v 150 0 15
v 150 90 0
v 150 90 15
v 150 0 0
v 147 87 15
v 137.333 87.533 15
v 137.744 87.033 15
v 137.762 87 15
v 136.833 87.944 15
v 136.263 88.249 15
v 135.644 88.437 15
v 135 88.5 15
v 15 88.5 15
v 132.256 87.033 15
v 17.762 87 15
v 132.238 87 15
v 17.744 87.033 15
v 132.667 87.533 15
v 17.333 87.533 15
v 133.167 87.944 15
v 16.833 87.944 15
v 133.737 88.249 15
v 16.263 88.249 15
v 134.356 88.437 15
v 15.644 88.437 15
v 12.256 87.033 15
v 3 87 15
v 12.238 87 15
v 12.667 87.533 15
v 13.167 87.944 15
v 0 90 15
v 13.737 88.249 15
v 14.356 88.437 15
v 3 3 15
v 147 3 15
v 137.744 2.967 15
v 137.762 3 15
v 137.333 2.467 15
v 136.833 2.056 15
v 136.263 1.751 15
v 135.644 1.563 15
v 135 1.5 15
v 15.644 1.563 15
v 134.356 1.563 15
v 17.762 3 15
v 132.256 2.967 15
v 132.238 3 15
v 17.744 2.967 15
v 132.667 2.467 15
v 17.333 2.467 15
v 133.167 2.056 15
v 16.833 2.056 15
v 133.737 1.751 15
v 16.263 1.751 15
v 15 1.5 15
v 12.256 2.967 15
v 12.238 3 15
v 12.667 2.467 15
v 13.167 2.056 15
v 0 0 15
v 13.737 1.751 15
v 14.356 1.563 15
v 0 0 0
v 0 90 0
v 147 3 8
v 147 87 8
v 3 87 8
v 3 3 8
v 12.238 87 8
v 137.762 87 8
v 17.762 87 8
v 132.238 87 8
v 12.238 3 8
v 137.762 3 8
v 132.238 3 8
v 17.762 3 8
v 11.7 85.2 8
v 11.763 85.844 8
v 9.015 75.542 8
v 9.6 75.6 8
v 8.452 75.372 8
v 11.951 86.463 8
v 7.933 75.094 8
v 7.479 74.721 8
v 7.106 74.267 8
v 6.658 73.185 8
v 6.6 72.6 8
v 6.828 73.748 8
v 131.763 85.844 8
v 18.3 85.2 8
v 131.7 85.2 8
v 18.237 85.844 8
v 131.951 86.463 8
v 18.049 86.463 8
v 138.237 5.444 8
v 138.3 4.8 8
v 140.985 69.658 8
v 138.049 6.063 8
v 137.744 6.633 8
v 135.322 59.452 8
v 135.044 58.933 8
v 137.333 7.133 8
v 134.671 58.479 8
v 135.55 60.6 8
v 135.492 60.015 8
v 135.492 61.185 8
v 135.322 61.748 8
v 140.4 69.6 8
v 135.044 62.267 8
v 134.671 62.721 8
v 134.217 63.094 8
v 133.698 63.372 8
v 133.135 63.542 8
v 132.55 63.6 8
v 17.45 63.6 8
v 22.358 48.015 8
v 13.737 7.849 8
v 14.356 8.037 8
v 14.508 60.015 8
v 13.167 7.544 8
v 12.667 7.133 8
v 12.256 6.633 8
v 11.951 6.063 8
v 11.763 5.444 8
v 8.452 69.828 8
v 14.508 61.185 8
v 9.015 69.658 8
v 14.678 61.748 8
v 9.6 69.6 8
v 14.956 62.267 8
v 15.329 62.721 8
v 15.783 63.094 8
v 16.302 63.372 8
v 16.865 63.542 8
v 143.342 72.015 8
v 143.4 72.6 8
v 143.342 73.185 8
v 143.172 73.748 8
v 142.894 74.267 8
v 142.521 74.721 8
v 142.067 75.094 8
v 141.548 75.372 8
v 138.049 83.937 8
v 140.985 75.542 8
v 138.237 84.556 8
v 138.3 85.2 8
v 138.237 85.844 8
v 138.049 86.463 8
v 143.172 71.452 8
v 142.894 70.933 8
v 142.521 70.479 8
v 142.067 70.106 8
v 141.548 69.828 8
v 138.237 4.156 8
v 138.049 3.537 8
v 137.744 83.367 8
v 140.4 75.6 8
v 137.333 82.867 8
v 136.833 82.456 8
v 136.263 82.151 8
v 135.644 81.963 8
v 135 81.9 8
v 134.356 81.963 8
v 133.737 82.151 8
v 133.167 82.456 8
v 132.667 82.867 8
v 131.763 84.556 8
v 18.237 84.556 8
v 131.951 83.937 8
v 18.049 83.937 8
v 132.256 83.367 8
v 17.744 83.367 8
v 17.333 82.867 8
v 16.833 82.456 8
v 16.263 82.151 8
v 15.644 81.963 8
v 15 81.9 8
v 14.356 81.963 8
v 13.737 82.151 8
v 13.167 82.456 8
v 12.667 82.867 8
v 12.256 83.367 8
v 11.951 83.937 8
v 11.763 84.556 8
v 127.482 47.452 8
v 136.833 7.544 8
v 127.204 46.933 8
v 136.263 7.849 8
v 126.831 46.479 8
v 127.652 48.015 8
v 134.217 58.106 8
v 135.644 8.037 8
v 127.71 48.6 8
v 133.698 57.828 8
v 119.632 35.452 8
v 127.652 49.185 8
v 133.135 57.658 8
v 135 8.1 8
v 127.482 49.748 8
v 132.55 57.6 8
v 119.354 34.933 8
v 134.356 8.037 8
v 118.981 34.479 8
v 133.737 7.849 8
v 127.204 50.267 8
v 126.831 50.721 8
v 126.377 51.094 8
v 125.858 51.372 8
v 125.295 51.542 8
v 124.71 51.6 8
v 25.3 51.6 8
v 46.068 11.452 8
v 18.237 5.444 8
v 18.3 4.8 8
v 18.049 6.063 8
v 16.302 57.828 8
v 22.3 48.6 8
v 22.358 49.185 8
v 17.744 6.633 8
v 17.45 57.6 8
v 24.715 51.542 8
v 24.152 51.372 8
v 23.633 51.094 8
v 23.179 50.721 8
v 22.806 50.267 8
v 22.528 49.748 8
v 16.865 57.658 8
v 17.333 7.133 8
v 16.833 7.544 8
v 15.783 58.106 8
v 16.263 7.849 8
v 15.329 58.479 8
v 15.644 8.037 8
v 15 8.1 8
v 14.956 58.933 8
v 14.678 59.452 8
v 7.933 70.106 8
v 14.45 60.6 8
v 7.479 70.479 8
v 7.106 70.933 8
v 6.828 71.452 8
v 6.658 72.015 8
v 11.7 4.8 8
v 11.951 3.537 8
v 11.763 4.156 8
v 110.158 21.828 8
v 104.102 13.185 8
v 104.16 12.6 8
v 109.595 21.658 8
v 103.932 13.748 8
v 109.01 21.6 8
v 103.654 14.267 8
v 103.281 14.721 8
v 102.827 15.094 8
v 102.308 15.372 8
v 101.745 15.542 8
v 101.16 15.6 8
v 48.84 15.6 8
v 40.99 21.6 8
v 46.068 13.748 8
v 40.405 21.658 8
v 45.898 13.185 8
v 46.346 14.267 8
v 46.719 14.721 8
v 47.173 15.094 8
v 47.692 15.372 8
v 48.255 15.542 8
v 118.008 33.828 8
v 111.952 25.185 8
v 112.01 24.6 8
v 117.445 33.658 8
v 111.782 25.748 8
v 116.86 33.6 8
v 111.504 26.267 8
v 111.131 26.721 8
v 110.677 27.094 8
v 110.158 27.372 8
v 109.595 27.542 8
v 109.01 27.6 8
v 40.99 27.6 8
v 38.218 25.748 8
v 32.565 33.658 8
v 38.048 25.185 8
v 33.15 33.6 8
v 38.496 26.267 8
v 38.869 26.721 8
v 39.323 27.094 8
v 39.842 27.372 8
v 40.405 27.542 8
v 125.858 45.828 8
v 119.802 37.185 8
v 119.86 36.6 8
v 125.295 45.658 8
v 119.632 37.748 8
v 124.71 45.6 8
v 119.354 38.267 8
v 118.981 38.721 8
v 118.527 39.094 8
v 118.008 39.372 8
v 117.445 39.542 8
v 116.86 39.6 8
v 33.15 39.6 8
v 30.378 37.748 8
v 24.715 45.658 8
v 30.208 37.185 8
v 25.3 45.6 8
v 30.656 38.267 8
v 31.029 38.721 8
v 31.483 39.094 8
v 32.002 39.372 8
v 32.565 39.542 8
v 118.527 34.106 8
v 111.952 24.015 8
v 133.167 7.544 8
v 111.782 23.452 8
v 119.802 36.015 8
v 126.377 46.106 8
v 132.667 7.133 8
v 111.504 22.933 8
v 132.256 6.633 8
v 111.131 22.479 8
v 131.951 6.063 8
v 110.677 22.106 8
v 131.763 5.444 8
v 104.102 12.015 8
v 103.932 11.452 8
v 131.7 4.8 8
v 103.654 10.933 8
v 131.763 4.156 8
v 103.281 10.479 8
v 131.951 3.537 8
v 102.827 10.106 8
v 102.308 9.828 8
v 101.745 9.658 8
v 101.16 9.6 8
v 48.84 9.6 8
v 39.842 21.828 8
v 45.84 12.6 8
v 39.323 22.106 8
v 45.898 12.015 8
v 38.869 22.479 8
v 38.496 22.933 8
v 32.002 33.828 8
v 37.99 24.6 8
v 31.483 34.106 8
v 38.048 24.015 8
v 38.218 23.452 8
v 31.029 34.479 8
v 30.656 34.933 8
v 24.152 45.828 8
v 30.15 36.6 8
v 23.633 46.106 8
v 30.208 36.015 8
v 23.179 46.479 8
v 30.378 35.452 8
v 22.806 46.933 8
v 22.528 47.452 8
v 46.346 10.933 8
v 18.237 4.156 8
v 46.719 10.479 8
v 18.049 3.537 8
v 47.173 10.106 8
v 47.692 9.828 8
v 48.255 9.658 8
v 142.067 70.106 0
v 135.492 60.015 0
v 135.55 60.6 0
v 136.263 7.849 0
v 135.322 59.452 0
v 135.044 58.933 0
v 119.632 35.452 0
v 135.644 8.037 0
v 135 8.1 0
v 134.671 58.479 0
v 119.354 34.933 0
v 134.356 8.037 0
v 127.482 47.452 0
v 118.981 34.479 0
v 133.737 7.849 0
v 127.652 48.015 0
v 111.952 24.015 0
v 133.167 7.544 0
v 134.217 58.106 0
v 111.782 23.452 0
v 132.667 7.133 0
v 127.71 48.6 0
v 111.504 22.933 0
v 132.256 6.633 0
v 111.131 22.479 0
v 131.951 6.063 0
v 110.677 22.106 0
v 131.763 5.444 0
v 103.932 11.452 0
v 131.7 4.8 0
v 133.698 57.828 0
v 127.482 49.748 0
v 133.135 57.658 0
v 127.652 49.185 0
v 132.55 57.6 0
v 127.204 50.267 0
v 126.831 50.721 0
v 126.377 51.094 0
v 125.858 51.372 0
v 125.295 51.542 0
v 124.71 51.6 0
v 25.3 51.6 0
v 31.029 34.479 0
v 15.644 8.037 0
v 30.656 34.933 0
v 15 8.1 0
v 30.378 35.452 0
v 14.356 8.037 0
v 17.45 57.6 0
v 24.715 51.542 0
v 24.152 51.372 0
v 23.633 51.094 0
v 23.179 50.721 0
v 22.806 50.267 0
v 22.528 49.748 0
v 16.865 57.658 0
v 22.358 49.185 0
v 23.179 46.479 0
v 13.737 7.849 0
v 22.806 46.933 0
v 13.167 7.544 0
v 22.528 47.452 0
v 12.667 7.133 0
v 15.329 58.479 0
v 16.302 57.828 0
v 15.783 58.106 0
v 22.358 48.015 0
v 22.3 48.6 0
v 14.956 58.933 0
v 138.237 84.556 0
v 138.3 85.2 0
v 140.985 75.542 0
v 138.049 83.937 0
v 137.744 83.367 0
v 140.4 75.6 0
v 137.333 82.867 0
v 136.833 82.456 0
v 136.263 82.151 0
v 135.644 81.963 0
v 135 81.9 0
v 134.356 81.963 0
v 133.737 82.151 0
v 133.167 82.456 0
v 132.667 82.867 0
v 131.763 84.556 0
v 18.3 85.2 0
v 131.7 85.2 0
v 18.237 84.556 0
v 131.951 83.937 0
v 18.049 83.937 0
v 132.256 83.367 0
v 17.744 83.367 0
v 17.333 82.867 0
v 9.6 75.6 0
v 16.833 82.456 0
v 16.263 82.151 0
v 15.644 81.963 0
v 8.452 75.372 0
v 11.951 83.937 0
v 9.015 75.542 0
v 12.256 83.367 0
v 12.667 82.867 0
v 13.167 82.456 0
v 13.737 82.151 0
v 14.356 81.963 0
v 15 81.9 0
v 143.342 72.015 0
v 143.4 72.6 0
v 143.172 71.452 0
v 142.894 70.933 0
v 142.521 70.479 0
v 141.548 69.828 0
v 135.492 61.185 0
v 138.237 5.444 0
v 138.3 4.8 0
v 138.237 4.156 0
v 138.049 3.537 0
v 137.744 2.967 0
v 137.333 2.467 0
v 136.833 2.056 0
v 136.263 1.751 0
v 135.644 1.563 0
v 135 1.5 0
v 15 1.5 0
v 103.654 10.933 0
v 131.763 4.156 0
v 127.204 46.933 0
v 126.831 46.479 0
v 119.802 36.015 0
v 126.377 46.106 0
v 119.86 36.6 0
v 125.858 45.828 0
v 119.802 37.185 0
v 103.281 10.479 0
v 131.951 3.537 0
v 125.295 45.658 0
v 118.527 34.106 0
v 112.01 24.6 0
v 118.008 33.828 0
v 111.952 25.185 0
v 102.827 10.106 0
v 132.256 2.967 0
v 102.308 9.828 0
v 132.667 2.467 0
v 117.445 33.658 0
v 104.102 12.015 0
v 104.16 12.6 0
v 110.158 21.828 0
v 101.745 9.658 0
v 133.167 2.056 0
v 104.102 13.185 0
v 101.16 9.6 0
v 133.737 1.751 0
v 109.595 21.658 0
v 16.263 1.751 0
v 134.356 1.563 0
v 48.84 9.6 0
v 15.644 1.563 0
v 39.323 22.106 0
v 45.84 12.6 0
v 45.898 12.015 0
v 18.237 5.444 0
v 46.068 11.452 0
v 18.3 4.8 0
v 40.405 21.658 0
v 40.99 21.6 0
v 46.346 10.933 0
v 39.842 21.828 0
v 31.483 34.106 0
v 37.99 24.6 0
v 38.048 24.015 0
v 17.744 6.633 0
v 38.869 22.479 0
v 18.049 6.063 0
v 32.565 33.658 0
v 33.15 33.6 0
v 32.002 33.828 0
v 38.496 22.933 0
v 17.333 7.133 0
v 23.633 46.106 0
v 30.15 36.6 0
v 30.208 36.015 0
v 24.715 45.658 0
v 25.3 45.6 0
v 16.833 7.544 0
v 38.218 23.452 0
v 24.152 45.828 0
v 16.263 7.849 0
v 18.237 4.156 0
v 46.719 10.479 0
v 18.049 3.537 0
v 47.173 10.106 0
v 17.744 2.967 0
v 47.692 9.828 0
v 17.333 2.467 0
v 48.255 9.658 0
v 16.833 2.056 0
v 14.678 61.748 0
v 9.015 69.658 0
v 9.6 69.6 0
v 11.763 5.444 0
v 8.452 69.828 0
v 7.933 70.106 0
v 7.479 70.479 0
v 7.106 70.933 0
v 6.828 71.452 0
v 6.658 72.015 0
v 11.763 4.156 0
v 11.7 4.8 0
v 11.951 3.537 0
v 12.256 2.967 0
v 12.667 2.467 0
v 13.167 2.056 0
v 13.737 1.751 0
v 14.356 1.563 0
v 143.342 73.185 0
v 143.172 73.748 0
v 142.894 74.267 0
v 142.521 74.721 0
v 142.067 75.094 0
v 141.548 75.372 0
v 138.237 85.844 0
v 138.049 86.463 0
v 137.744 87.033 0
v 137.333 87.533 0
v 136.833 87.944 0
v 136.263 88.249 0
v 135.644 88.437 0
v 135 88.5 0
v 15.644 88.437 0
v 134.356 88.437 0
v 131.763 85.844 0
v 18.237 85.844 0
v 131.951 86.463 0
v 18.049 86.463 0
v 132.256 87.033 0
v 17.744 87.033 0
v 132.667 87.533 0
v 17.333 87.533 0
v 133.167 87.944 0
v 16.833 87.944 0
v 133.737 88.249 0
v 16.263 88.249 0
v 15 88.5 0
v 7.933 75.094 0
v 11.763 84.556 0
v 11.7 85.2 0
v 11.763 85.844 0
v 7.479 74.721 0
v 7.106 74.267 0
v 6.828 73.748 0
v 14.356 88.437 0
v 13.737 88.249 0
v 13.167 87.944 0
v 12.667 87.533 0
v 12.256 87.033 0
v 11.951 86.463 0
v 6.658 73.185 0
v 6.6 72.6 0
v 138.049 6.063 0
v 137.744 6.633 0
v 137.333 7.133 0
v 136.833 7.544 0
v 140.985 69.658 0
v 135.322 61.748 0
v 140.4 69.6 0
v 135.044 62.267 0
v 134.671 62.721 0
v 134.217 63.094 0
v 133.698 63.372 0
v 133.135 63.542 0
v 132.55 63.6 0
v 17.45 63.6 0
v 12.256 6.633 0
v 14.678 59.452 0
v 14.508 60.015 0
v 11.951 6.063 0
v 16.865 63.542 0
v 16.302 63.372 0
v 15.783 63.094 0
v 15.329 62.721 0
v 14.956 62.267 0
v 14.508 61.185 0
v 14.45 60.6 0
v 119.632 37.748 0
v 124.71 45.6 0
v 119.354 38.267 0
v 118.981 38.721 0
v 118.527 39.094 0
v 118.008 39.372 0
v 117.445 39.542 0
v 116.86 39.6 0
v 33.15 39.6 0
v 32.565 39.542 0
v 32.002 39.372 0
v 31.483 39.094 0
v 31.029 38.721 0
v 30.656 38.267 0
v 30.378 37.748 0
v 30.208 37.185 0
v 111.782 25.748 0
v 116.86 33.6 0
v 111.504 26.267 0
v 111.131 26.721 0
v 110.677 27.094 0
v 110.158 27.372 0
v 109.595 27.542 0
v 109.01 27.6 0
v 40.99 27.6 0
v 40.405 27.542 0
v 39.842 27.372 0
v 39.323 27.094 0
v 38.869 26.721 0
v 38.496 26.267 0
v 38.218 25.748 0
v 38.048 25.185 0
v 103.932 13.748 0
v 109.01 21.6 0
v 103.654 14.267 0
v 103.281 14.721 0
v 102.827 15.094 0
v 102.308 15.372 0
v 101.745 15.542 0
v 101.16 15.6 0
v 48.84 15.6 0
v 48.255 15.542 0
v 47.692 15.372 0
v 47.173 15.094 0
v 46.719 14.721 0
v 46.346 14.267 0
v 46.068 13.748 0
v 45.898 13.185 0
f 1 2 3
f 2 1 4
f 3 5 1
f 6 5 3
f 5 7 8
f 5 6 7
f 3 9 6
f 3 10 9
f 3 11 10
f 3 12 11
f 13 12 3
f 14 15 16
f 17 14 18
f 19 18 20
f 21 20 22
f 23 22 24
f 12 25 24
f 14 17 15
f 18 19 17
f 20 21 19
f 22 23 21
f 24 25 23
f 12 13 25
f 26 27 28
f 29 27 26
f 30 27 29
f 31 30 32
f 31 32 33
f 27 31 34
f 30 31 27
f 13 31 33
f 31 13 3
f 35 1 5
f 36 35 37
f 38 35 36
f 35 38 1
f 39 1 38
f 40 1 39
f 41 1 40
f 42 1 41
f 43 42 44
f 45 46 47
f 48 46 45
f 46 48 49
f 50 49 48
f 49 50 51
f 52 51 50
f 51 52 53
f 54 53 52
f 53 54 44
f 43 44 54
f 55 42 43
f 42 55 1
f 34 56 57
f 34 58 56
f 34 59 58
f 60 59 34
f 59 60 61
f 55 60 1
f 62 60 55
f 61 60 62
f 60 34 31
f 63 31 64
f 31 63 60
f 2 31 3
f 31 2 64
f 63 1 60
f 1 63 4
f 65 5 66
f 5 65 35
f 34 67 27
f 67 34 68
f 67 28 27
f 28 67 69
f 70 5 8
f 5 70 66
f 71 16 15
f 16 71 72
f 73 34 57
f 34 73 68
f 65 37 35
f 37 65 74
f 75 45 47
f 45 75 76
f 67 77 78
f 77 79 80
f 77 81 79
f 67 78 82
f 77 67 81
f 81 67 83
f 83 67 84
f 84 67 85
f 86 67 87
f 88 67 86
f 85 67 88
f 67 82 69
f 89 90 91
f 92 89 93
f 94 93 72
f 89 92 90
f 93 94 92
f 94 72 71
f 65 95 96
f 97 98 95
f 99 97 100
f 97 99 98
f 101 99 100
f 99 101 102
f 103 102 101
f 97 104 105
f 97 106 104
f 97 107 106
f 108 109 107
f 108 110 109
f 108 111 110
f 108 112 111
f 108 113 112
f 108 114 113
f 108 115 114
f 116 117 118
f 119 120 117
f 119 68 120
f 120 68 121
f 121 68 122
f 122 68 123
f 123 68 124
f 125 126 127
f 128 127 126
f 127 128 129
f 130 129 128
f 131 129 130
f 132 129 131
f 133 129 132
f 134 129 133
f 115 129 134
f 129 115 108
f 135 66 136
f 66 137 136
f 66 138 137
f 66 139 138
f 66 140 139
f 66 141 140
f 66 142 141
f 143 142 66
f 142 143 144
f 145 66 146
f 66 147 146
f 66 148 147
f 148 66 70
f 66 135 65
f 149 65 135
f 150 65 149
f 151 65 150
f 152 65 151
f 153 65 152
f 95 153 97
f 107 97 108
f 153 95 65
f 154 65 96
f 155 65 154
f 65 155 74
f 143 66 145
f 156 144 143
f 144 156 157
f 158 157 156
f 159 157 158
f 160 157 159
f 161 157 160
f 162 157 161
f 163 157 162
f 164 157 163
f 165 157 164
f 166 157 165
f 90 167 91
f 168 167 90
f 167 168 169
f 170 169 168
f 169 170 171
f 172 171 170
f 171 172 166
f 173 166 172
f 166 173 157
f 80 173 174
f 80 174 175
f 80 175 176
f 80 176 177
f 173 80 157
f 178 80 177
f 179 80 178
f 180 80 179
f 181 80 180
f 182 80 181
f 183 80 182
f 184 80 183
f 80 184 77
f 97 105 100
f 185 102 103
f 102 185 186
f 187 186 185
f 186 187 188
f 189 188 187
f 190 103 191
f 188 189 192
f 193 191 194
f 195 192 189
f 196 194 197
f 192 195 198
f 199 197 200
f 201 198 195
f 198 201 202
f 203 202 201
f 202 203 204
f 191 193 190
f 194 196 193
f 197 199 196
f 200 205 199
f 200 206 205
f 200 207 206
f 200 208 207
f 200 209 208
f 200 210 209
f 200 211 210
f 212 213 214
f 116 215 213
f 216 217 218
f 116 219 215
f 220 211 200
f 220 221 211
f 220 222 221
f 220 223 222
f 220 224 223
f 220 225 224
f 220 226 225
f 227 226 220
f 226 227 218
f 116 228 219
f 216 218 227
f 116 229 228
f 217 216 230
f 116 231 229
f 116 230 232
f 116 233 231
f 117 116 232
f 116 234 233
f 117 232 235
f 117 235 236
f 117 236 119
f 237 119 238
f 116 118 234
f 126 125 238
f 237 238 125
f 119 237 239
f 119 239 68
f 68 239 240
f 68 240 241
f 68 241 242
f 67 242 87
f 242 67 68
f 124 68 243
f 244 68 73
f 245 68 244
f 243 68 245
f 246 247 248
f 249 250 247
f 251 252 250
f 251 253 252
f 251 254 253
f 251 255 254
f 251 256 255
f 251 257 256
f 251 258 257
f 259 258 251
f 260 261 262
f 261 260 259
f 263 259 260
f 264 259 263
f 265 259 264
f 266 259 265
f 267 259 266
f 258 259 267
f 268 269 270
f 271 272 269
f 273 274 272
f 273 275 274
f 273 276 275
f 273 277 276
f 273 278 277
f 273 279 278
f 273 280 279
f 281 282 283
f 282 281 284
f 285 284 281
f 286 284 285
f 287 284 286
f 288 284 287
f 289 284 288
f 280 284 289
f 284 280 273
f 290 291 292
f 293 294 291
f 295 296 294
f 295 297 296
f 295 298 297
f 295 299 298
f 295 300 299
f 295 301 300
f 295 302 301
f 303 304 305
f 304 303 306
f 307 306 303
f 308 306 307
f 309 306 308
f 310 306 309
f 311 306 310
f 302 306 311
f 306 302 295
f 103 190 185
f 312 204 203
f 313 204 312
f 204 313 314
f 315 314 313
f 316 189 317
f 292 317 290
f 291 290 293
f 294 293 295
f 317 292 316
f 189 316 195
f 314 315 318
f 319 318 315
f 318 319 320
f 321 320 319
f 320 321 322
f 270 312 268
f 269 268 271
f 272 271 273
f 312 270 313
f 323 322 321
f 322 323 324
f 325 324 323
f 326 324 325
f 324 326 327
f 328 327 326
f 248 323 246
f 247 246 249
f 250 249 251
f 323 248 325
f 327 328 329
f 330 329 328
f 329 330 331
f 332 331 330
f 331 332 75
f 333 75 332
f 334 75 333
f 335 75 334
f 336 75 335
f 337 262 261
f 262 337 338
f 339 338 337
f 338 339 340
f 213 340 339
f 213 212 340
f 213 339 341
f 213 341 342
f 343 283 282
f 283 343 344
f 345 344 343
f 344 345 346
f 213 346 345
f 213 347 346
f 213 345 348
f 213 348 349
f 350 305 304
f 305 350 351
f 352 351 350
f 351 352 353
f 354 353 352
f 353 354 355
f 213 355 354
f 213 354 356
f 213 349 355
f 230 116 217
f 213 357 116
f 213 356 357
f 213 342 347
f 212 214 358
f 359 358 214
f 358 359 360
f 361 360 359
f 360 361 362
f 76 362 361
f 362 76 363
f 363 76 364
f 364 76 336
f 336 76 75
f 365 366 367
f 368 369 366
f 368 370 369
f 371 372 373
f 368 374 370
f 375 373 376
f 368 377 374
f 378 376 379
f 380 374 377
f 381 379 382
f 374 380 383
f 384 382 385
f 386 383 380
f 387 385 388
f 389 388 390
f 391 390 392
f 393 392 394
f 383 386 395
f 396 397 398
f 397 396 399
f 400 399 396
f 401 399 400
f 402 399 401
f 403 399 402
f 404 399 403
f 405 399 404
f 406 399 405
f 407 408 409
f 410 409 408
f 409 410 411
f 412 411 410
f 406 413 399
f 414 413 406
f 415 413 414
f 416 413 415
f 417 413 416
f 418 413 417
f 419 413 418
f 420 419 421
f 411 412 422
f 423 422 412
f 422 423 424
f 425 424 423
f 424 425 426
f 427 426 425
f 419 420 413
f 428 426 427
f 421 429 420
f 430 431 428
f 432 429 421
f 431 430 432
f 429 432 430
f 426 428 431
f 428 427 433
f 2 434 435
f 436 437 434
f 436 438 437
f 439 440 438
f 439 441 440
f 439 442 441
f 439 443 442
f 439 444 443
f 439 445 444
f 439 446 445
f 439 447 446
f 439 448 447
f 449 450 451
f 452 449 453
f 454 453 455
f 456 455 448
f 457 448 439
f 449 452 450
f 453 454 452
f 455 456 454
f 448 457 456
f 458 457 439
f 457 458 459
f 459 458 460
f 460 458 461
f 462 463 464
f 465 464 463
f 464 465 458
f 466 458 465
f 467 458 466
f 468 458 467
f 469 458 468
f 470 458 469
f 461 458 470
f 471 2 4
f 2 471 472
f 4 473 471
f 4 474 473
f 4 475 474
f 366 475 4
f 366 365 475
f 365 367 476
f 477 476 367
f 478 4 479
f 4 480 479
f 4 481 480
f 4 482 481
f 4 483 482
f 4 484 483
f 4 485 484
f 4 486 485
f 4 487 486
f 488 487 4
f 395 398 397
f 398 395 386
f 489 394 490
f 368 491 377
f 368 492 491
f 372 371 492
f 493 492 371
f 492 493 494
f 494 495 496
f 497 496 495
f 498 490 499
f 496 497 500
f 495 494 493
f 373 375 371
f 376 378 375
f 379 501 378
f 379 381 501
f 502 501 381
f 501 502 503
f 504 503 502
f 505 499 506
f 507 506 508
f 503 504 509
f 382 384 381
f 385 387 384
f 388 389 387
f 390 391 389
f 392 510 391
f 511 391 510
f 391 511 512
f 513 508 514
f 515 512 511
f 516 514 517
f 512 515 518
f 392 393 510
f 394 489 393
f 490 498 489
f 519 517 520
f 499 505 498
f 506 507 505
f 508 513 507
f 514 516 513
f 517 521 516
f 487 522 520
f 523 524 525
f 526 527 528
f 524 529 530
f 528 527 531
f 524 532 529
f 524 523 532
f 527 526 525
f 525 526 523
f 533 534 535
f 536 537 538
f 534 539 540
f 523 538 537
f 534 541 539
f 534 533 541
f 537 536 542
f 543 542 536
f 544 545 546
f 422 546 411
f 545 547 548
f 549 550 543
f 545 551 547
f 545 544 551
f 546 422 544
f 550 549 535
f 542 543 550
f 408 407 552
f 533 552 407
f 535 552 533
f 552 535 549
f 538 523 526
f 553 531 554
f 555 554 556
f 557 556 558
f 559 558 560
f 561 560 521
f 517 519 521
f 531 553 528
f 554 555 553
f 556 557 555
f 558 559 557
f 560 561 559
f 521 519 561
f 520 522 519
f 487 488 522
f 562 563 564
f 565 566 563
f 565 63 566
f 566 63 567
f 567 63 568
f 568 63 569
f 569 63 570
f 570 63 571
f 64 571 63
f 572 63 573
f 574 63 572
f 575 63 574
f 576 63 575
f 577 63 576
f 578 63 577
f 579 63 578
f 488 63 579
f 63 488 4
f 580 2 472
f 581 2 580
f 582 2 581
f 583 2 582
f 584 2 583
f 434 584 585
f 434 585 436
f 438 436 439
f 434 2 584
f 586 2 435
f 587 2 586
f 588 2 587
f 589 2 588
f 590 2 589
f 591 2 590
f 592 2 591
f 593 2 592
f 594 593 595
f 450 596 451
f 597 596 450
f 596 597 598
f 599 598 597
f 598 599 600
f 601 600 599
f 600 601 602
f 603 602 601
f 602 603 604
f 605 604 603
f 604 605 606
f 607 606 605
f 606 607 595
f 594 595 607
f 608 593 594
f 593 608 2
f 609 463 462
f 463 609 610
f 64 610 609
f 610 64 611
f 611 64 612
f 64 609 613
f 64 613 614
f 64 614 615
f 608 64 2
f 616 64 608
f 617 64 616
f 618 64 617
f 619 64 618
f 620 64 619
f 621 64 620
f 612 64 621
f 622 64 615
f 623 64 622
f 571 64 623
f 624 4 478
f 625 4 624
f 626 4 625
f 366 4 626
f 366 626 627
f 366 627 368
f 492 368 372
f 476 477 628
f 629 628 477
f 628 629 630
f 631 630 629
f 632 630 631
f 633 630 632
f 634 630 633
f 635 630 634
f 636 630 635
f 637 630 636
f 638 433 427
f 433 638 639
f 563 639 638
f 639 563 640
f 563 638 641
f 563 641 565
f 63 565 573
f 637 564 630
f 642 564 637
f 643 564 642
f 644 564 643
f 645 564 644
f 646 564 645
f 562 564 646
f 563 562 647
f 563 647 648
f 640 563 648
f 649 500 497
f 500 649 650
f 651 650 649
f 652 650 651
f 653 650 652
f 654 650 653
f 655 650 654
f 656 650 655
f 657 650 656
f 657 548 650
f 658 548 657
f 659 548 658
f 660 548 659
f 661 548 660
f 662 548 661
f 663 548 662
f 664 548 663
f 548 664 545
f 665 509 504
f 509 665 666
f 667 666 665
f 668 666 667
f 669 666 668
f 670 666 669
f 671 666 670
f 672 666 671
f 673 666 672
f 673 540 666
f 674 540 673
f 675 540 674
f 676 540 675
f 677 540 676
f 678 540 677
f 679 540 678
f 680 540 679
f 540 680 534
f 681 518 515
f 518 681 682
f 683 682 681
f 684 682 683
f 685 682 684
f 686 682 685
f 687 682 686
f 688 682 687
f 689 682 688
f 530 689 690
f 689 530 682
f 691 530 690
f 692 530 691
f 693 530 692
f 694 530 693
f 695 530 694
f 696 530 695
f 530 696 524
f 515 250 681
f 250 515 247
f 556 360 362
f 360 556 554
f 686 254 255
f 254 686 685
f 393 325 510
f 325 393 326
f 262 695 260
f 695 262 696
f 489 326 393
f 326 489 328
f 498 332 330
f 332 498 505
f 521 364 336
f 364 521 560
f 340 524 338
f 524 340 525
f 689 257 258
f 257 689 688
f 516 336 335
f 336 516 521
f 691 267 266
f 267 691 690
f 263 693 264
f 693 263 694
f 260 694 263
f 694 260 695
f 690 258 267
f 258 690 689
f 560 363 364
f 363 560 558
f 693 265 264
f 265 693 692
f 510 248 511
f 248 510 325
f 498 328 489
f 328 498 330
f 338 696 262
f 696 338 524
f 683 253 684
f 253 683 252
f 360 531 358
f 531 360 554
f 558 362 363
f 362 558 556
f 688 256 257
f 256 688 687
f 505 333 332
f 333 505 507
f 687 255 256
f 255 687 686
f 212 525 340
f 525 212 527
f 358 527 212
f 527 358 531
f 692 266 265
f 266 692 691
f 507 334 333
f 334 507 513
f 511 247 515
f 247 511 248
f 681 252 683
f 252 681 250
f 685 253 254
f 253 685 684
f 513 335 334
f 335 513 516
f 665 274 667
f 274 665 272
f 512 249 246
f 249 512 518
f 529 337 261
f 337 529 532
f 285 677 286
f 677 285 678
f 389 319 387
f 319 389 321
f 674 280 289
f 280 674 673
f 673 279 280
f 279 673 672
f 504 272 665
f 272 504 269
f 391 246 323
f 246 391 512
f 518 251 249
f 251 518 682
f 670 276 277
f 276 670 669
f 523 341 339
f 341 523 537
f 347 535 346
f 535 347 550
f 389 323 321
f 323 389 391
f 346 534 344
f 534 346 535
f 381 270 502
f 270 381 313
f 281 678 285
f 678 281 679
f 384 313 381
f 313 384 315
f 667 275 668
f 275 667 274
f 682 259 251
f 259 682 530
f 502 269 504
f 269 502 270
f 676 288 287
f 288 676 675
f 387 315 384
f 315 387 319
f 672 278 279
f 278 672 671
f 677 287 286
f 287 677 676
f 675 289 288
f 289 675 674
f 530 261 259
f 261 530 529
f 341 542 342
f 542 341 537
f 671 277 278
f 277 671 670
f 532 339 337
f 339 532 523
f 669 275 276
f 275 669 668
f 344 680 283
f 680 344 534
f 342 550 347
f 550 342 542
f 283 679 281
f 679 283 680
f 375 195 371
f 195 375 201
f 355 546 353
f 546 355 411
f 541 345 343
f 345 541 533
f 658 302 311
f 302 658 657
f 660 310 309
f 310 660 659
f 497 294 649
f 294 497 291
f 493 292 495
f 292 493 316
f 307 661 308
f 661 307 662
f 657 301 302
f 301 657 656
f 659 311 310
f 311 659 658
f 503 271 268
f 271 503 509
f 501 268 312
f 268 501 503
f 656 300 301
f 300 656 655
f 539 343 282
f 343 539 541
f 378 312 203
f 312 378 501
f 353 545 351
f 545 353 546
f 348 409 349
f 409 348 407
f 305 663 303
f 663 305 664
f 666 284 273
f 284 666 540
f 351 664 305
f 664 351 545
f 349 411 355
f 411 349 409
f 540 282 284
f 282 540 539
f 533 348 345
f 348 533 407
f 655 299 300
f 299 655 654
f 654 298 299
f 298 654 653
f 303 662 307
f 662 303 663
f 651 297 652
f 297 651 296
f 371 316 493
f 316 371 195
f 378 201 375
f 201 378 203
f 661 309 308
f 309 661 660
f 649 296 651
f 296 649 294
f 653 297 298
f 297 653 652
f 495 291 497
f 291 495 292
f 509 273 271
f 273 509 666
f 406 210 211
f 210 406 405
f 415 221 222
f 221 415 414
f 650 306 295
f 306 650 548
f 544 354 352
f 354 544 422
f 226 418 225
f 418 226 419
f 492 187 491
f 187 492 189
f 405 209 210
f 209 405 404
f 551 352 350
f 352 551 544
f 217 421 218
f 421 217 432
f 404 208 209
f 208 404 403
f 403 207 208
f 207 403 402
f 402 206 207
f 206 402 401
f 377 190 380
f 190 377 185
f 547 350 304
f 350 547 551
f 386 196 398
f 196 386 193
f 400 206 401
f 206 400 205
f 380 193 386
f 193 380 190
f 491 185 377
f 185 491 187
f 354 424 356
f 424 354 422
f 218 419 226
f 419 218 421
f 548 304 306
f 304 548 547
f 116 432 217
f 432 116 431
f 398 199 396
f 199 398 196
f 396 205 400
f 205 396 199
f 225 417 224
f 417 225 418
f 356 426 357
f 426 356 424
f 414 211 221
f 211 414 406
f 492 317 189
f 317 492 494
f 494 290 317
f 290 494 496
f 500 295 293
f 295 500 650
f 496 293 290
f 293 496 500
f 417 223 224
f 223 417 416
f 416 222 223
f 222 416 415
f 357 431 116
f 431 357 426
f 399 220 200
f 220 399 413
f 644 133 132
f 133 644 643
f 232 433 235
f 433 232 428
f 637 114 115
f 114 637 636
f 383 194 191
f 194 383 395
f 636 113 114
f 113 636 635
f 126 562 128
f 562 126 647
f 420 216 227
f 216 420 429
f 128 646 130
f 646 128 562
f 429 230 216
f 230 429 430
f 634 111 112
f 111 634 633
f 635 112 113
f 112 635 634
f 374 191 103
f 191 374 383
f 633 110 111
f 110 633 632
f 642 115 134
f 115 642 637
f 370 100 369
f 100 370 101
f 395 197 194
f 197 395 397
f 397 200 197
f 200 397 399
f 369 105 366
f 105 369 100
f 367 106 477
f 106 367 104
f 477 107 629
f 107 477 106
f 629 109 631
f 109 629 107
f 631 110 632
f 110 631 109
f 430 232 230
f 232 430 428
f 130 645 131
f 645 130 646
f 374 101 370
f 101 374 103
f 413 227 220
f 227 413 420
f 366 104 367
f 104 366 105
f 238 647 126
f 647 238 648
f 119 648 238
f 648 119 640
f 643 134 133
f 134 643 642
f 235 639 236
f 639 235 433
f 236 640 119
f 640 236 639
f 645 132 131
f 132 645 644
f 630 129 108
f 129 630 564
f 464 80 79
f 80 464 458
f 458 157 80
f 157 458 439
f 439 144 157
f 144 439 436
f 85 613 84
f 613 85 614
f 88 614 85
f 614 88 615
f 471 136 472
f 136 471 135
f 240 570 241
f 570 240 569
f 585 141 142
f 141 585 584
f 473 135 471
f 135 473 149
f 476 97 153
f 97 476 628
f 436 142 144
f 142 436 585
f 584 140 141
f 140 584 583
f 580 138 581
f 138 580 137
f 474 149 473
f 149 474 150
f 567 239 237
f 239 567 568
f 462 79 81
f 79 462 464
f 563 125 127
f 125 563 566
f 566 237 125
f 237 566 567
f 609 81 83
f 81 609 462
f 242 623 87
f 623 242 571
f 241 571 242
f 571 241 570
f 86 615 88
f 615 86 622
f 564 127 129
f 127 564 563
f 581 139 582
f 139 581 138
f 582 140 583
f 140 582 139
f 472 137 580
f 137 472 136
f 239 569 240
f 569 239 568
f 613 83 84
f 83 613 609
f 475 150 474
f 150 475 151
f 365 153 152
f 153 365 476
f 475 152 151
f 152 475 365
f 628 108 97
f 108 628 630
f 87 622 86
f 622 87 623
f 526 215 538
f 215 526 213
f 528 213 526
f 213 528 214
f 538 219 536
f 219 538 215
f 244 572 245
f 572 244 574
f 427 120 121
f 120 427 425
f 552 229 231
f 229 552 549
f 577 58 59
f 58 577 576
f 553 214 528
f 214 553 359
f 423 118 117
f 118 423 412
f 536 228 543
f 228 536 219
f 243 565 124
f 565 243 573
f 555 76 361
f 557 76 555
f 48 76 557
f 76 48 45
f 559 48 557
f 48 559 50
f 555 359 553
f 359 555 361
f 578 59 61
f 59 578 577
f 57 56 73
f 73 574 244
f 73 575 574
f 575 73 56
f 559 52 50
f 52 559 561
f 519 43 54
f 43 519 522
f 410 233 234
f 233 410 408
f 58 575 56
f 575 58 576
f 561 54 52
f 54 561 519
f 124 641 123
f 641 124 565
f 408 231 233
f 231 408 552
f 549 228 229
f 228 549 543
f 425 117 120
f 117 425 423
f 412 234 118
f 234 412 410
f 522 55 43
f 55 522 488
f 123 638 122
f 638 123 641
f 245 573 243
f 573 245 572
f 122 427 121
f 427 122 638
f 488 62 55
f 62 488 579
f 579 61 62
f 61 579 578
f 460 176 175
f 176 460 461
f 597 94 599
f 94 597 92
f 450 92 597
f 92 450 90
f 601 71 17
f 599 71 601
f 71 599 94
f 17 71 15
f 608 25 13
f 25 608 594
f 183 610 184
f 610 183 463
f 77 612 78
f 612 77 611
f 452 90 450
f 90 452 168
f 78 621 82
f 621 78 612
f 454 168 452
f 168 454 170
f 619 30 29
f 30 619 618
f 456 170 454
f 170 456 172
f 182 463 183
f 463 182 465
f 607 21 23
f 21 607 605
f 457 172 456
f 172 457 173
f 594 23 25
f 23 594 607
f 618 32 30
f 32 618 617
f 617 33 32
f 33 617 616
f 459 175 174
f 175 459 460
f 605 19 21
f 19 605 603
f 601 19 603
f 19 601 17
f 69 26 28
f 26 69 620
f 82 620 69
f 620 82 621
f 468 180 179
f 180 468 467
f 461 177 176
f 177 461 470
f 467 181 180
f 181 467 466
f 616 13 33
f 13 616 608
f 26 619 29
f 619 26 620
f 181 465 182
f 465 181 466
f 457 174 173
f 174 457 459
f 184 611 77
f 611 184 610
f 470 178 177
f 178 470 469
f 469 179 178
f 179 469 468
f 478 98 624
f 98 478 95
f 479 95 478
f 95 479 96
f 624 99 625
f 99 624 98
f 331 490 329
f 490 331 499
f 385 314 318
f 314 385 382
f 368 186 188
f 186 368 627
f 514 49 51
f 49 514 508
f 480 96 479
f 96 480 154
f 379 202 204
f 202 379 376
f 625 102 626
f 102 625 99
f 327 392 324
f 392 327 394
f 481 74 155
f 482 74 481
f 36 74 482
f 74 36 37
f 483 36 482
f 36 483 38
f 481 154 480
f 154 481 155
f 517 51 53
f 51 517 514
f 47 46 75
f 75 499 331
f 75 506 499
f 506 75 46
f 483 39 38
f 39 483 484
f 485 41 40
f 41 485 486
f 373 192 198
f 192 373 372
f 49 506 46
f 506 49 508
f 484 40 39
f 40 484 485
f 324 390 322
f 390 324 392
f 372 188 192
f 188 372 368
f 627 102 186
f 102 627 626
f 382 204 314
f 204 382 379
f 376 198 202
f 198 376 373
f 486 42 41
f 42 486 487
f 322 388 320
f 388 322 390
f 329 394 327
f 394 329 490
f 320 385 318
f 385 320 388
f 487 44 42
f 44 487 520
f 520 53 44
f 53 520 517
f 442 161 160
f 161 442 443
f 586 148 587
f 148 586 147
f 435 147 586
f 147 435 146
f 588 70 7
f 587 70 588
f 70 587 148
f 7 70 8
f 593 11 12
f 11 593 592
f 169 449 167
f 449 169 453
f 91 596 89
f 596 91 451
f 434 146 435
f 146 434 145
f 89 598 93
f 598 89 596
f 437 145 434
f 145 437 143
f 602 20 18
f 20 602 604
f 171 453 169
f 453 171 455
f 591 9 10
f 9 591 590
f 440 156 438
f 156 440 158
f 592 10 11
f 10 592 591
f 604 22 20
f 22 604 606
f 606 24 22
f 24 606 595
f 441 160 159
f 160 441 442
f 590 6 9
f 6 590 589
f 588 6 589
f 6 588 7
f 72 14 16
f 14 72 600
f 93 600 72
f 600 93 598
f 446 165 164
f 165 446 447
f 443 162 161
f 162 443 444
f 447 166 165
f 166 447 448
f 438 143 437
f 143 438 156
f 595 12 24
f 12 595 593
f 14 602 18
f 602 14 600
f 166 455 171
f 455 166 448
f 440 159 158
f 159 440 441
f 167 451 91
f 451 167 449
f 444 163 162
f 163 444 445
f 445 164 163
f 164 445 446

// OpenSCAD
$fn = 32;

// ----------------------------------------------------------------------
// Slotted panel: 150 x 90 mm, 6 рядов of slots
// ----------------------------------------------------------------------

// --- parameters (mm) ---
panel_w = 150;            // panel width
panel_d = 90;             // panel depth
thick = 8;                // panel thickness
slot_w = 6;               // slot width
pitch0 = 12;              // first row pitch
pitch_step = 2.4;         // pitch increase per row
margin = 9.6;             // margin around the slot field
rows = 6;                 // number of slot rows
mount_d = 6.6;            // mounting holes
mount_x = 60;             // mounting hole offset
rim_h = 15;               // rim height
rim_t = 3;                // rim wall thickness

difference() {
  union() {
    cube([panel_w, panel_d, thick]);
    translate([0, 0, thick - 1]) difference() {
      cube([panel_w, panel_d, rim_h - thick + 1]);
      translate([rim_t, rim_t, -2.5]) cube([panel_w - 2 * rim_t, panel_d - 2 * rim_t, rim_h - thick + 6]);
    }
  }
  /* slot rows: stadium shaped cutters, 2.5 mm clear of both faces */
  /* row 0: pitch 12, length 52.32 */
  hull() {
    translate([48.84, 12.6, -2.5]) cylinder(h = thick + 5, d = slot_w);
    translate([101.16, 12.6, -2.5]) cylinder(h = thick + 5, d = slot_w);
  }
  /* row 1: pitch 12, length 68.02 */
  hull() {
    translate([40.99, 24.6, -2.5]) cylinder(h = thick + 5, d = slot_w);
    translate([109.01, 24.6, -2.5]) cylinder(h = thick + 5, d = slot_w);
  }
  /* row 2: pitch 12, length 83.71 */
  hull() {
    translate([33.15, 36.6, -2.5]) cylinder(h = thick + 5, d = slot_w);
    translate([116.86, 36.6, -2.5]) cylinder(h = thick + 5, d = slot_w);
  }
  /* row 3: pitch 12, length 99.41 */
  hull() {
    translate([25.3, 48.6, -2.5]) cylinder(h = thick + 5, d = slot_w);
    translate([124.71, 48.6, -2.5]) cylinder(h = thick + 5, d = slot_w);
  }
  /* row 4: pitch 12, length 115.1 */
  hull() {
    translate([17.45, 60.6, -2.5]) cylinder(h = thick + 5, d = slot_w);
    translate([132.55, 60.6, -2.5]) cylinder(h = thick + 5, d = slot_w);
  }
  /* row 5: pitch 12, length 130.8 */
  hull() {
    translate([9.6, 72.6, -2.5]) cylinder(h = thick + 5, d = slot_w);
    translate([140.4, 72.6, -2.5]) cylinder(h = thick + 5, d = slot_w);
  }
  translate([15, 4.8, -2.5]) cylinder(h = 20, d = mount_d);
  translate([15, 85.2, -2.5]) cylinder(h = 20, d = mount_d);
  translate([135, 4.8, -2.5]) cylinder(h = 20, d = mount_d);
  translate([135, 85.2, -2.5]) cylinder(h = 20, d = mount_d);
}
